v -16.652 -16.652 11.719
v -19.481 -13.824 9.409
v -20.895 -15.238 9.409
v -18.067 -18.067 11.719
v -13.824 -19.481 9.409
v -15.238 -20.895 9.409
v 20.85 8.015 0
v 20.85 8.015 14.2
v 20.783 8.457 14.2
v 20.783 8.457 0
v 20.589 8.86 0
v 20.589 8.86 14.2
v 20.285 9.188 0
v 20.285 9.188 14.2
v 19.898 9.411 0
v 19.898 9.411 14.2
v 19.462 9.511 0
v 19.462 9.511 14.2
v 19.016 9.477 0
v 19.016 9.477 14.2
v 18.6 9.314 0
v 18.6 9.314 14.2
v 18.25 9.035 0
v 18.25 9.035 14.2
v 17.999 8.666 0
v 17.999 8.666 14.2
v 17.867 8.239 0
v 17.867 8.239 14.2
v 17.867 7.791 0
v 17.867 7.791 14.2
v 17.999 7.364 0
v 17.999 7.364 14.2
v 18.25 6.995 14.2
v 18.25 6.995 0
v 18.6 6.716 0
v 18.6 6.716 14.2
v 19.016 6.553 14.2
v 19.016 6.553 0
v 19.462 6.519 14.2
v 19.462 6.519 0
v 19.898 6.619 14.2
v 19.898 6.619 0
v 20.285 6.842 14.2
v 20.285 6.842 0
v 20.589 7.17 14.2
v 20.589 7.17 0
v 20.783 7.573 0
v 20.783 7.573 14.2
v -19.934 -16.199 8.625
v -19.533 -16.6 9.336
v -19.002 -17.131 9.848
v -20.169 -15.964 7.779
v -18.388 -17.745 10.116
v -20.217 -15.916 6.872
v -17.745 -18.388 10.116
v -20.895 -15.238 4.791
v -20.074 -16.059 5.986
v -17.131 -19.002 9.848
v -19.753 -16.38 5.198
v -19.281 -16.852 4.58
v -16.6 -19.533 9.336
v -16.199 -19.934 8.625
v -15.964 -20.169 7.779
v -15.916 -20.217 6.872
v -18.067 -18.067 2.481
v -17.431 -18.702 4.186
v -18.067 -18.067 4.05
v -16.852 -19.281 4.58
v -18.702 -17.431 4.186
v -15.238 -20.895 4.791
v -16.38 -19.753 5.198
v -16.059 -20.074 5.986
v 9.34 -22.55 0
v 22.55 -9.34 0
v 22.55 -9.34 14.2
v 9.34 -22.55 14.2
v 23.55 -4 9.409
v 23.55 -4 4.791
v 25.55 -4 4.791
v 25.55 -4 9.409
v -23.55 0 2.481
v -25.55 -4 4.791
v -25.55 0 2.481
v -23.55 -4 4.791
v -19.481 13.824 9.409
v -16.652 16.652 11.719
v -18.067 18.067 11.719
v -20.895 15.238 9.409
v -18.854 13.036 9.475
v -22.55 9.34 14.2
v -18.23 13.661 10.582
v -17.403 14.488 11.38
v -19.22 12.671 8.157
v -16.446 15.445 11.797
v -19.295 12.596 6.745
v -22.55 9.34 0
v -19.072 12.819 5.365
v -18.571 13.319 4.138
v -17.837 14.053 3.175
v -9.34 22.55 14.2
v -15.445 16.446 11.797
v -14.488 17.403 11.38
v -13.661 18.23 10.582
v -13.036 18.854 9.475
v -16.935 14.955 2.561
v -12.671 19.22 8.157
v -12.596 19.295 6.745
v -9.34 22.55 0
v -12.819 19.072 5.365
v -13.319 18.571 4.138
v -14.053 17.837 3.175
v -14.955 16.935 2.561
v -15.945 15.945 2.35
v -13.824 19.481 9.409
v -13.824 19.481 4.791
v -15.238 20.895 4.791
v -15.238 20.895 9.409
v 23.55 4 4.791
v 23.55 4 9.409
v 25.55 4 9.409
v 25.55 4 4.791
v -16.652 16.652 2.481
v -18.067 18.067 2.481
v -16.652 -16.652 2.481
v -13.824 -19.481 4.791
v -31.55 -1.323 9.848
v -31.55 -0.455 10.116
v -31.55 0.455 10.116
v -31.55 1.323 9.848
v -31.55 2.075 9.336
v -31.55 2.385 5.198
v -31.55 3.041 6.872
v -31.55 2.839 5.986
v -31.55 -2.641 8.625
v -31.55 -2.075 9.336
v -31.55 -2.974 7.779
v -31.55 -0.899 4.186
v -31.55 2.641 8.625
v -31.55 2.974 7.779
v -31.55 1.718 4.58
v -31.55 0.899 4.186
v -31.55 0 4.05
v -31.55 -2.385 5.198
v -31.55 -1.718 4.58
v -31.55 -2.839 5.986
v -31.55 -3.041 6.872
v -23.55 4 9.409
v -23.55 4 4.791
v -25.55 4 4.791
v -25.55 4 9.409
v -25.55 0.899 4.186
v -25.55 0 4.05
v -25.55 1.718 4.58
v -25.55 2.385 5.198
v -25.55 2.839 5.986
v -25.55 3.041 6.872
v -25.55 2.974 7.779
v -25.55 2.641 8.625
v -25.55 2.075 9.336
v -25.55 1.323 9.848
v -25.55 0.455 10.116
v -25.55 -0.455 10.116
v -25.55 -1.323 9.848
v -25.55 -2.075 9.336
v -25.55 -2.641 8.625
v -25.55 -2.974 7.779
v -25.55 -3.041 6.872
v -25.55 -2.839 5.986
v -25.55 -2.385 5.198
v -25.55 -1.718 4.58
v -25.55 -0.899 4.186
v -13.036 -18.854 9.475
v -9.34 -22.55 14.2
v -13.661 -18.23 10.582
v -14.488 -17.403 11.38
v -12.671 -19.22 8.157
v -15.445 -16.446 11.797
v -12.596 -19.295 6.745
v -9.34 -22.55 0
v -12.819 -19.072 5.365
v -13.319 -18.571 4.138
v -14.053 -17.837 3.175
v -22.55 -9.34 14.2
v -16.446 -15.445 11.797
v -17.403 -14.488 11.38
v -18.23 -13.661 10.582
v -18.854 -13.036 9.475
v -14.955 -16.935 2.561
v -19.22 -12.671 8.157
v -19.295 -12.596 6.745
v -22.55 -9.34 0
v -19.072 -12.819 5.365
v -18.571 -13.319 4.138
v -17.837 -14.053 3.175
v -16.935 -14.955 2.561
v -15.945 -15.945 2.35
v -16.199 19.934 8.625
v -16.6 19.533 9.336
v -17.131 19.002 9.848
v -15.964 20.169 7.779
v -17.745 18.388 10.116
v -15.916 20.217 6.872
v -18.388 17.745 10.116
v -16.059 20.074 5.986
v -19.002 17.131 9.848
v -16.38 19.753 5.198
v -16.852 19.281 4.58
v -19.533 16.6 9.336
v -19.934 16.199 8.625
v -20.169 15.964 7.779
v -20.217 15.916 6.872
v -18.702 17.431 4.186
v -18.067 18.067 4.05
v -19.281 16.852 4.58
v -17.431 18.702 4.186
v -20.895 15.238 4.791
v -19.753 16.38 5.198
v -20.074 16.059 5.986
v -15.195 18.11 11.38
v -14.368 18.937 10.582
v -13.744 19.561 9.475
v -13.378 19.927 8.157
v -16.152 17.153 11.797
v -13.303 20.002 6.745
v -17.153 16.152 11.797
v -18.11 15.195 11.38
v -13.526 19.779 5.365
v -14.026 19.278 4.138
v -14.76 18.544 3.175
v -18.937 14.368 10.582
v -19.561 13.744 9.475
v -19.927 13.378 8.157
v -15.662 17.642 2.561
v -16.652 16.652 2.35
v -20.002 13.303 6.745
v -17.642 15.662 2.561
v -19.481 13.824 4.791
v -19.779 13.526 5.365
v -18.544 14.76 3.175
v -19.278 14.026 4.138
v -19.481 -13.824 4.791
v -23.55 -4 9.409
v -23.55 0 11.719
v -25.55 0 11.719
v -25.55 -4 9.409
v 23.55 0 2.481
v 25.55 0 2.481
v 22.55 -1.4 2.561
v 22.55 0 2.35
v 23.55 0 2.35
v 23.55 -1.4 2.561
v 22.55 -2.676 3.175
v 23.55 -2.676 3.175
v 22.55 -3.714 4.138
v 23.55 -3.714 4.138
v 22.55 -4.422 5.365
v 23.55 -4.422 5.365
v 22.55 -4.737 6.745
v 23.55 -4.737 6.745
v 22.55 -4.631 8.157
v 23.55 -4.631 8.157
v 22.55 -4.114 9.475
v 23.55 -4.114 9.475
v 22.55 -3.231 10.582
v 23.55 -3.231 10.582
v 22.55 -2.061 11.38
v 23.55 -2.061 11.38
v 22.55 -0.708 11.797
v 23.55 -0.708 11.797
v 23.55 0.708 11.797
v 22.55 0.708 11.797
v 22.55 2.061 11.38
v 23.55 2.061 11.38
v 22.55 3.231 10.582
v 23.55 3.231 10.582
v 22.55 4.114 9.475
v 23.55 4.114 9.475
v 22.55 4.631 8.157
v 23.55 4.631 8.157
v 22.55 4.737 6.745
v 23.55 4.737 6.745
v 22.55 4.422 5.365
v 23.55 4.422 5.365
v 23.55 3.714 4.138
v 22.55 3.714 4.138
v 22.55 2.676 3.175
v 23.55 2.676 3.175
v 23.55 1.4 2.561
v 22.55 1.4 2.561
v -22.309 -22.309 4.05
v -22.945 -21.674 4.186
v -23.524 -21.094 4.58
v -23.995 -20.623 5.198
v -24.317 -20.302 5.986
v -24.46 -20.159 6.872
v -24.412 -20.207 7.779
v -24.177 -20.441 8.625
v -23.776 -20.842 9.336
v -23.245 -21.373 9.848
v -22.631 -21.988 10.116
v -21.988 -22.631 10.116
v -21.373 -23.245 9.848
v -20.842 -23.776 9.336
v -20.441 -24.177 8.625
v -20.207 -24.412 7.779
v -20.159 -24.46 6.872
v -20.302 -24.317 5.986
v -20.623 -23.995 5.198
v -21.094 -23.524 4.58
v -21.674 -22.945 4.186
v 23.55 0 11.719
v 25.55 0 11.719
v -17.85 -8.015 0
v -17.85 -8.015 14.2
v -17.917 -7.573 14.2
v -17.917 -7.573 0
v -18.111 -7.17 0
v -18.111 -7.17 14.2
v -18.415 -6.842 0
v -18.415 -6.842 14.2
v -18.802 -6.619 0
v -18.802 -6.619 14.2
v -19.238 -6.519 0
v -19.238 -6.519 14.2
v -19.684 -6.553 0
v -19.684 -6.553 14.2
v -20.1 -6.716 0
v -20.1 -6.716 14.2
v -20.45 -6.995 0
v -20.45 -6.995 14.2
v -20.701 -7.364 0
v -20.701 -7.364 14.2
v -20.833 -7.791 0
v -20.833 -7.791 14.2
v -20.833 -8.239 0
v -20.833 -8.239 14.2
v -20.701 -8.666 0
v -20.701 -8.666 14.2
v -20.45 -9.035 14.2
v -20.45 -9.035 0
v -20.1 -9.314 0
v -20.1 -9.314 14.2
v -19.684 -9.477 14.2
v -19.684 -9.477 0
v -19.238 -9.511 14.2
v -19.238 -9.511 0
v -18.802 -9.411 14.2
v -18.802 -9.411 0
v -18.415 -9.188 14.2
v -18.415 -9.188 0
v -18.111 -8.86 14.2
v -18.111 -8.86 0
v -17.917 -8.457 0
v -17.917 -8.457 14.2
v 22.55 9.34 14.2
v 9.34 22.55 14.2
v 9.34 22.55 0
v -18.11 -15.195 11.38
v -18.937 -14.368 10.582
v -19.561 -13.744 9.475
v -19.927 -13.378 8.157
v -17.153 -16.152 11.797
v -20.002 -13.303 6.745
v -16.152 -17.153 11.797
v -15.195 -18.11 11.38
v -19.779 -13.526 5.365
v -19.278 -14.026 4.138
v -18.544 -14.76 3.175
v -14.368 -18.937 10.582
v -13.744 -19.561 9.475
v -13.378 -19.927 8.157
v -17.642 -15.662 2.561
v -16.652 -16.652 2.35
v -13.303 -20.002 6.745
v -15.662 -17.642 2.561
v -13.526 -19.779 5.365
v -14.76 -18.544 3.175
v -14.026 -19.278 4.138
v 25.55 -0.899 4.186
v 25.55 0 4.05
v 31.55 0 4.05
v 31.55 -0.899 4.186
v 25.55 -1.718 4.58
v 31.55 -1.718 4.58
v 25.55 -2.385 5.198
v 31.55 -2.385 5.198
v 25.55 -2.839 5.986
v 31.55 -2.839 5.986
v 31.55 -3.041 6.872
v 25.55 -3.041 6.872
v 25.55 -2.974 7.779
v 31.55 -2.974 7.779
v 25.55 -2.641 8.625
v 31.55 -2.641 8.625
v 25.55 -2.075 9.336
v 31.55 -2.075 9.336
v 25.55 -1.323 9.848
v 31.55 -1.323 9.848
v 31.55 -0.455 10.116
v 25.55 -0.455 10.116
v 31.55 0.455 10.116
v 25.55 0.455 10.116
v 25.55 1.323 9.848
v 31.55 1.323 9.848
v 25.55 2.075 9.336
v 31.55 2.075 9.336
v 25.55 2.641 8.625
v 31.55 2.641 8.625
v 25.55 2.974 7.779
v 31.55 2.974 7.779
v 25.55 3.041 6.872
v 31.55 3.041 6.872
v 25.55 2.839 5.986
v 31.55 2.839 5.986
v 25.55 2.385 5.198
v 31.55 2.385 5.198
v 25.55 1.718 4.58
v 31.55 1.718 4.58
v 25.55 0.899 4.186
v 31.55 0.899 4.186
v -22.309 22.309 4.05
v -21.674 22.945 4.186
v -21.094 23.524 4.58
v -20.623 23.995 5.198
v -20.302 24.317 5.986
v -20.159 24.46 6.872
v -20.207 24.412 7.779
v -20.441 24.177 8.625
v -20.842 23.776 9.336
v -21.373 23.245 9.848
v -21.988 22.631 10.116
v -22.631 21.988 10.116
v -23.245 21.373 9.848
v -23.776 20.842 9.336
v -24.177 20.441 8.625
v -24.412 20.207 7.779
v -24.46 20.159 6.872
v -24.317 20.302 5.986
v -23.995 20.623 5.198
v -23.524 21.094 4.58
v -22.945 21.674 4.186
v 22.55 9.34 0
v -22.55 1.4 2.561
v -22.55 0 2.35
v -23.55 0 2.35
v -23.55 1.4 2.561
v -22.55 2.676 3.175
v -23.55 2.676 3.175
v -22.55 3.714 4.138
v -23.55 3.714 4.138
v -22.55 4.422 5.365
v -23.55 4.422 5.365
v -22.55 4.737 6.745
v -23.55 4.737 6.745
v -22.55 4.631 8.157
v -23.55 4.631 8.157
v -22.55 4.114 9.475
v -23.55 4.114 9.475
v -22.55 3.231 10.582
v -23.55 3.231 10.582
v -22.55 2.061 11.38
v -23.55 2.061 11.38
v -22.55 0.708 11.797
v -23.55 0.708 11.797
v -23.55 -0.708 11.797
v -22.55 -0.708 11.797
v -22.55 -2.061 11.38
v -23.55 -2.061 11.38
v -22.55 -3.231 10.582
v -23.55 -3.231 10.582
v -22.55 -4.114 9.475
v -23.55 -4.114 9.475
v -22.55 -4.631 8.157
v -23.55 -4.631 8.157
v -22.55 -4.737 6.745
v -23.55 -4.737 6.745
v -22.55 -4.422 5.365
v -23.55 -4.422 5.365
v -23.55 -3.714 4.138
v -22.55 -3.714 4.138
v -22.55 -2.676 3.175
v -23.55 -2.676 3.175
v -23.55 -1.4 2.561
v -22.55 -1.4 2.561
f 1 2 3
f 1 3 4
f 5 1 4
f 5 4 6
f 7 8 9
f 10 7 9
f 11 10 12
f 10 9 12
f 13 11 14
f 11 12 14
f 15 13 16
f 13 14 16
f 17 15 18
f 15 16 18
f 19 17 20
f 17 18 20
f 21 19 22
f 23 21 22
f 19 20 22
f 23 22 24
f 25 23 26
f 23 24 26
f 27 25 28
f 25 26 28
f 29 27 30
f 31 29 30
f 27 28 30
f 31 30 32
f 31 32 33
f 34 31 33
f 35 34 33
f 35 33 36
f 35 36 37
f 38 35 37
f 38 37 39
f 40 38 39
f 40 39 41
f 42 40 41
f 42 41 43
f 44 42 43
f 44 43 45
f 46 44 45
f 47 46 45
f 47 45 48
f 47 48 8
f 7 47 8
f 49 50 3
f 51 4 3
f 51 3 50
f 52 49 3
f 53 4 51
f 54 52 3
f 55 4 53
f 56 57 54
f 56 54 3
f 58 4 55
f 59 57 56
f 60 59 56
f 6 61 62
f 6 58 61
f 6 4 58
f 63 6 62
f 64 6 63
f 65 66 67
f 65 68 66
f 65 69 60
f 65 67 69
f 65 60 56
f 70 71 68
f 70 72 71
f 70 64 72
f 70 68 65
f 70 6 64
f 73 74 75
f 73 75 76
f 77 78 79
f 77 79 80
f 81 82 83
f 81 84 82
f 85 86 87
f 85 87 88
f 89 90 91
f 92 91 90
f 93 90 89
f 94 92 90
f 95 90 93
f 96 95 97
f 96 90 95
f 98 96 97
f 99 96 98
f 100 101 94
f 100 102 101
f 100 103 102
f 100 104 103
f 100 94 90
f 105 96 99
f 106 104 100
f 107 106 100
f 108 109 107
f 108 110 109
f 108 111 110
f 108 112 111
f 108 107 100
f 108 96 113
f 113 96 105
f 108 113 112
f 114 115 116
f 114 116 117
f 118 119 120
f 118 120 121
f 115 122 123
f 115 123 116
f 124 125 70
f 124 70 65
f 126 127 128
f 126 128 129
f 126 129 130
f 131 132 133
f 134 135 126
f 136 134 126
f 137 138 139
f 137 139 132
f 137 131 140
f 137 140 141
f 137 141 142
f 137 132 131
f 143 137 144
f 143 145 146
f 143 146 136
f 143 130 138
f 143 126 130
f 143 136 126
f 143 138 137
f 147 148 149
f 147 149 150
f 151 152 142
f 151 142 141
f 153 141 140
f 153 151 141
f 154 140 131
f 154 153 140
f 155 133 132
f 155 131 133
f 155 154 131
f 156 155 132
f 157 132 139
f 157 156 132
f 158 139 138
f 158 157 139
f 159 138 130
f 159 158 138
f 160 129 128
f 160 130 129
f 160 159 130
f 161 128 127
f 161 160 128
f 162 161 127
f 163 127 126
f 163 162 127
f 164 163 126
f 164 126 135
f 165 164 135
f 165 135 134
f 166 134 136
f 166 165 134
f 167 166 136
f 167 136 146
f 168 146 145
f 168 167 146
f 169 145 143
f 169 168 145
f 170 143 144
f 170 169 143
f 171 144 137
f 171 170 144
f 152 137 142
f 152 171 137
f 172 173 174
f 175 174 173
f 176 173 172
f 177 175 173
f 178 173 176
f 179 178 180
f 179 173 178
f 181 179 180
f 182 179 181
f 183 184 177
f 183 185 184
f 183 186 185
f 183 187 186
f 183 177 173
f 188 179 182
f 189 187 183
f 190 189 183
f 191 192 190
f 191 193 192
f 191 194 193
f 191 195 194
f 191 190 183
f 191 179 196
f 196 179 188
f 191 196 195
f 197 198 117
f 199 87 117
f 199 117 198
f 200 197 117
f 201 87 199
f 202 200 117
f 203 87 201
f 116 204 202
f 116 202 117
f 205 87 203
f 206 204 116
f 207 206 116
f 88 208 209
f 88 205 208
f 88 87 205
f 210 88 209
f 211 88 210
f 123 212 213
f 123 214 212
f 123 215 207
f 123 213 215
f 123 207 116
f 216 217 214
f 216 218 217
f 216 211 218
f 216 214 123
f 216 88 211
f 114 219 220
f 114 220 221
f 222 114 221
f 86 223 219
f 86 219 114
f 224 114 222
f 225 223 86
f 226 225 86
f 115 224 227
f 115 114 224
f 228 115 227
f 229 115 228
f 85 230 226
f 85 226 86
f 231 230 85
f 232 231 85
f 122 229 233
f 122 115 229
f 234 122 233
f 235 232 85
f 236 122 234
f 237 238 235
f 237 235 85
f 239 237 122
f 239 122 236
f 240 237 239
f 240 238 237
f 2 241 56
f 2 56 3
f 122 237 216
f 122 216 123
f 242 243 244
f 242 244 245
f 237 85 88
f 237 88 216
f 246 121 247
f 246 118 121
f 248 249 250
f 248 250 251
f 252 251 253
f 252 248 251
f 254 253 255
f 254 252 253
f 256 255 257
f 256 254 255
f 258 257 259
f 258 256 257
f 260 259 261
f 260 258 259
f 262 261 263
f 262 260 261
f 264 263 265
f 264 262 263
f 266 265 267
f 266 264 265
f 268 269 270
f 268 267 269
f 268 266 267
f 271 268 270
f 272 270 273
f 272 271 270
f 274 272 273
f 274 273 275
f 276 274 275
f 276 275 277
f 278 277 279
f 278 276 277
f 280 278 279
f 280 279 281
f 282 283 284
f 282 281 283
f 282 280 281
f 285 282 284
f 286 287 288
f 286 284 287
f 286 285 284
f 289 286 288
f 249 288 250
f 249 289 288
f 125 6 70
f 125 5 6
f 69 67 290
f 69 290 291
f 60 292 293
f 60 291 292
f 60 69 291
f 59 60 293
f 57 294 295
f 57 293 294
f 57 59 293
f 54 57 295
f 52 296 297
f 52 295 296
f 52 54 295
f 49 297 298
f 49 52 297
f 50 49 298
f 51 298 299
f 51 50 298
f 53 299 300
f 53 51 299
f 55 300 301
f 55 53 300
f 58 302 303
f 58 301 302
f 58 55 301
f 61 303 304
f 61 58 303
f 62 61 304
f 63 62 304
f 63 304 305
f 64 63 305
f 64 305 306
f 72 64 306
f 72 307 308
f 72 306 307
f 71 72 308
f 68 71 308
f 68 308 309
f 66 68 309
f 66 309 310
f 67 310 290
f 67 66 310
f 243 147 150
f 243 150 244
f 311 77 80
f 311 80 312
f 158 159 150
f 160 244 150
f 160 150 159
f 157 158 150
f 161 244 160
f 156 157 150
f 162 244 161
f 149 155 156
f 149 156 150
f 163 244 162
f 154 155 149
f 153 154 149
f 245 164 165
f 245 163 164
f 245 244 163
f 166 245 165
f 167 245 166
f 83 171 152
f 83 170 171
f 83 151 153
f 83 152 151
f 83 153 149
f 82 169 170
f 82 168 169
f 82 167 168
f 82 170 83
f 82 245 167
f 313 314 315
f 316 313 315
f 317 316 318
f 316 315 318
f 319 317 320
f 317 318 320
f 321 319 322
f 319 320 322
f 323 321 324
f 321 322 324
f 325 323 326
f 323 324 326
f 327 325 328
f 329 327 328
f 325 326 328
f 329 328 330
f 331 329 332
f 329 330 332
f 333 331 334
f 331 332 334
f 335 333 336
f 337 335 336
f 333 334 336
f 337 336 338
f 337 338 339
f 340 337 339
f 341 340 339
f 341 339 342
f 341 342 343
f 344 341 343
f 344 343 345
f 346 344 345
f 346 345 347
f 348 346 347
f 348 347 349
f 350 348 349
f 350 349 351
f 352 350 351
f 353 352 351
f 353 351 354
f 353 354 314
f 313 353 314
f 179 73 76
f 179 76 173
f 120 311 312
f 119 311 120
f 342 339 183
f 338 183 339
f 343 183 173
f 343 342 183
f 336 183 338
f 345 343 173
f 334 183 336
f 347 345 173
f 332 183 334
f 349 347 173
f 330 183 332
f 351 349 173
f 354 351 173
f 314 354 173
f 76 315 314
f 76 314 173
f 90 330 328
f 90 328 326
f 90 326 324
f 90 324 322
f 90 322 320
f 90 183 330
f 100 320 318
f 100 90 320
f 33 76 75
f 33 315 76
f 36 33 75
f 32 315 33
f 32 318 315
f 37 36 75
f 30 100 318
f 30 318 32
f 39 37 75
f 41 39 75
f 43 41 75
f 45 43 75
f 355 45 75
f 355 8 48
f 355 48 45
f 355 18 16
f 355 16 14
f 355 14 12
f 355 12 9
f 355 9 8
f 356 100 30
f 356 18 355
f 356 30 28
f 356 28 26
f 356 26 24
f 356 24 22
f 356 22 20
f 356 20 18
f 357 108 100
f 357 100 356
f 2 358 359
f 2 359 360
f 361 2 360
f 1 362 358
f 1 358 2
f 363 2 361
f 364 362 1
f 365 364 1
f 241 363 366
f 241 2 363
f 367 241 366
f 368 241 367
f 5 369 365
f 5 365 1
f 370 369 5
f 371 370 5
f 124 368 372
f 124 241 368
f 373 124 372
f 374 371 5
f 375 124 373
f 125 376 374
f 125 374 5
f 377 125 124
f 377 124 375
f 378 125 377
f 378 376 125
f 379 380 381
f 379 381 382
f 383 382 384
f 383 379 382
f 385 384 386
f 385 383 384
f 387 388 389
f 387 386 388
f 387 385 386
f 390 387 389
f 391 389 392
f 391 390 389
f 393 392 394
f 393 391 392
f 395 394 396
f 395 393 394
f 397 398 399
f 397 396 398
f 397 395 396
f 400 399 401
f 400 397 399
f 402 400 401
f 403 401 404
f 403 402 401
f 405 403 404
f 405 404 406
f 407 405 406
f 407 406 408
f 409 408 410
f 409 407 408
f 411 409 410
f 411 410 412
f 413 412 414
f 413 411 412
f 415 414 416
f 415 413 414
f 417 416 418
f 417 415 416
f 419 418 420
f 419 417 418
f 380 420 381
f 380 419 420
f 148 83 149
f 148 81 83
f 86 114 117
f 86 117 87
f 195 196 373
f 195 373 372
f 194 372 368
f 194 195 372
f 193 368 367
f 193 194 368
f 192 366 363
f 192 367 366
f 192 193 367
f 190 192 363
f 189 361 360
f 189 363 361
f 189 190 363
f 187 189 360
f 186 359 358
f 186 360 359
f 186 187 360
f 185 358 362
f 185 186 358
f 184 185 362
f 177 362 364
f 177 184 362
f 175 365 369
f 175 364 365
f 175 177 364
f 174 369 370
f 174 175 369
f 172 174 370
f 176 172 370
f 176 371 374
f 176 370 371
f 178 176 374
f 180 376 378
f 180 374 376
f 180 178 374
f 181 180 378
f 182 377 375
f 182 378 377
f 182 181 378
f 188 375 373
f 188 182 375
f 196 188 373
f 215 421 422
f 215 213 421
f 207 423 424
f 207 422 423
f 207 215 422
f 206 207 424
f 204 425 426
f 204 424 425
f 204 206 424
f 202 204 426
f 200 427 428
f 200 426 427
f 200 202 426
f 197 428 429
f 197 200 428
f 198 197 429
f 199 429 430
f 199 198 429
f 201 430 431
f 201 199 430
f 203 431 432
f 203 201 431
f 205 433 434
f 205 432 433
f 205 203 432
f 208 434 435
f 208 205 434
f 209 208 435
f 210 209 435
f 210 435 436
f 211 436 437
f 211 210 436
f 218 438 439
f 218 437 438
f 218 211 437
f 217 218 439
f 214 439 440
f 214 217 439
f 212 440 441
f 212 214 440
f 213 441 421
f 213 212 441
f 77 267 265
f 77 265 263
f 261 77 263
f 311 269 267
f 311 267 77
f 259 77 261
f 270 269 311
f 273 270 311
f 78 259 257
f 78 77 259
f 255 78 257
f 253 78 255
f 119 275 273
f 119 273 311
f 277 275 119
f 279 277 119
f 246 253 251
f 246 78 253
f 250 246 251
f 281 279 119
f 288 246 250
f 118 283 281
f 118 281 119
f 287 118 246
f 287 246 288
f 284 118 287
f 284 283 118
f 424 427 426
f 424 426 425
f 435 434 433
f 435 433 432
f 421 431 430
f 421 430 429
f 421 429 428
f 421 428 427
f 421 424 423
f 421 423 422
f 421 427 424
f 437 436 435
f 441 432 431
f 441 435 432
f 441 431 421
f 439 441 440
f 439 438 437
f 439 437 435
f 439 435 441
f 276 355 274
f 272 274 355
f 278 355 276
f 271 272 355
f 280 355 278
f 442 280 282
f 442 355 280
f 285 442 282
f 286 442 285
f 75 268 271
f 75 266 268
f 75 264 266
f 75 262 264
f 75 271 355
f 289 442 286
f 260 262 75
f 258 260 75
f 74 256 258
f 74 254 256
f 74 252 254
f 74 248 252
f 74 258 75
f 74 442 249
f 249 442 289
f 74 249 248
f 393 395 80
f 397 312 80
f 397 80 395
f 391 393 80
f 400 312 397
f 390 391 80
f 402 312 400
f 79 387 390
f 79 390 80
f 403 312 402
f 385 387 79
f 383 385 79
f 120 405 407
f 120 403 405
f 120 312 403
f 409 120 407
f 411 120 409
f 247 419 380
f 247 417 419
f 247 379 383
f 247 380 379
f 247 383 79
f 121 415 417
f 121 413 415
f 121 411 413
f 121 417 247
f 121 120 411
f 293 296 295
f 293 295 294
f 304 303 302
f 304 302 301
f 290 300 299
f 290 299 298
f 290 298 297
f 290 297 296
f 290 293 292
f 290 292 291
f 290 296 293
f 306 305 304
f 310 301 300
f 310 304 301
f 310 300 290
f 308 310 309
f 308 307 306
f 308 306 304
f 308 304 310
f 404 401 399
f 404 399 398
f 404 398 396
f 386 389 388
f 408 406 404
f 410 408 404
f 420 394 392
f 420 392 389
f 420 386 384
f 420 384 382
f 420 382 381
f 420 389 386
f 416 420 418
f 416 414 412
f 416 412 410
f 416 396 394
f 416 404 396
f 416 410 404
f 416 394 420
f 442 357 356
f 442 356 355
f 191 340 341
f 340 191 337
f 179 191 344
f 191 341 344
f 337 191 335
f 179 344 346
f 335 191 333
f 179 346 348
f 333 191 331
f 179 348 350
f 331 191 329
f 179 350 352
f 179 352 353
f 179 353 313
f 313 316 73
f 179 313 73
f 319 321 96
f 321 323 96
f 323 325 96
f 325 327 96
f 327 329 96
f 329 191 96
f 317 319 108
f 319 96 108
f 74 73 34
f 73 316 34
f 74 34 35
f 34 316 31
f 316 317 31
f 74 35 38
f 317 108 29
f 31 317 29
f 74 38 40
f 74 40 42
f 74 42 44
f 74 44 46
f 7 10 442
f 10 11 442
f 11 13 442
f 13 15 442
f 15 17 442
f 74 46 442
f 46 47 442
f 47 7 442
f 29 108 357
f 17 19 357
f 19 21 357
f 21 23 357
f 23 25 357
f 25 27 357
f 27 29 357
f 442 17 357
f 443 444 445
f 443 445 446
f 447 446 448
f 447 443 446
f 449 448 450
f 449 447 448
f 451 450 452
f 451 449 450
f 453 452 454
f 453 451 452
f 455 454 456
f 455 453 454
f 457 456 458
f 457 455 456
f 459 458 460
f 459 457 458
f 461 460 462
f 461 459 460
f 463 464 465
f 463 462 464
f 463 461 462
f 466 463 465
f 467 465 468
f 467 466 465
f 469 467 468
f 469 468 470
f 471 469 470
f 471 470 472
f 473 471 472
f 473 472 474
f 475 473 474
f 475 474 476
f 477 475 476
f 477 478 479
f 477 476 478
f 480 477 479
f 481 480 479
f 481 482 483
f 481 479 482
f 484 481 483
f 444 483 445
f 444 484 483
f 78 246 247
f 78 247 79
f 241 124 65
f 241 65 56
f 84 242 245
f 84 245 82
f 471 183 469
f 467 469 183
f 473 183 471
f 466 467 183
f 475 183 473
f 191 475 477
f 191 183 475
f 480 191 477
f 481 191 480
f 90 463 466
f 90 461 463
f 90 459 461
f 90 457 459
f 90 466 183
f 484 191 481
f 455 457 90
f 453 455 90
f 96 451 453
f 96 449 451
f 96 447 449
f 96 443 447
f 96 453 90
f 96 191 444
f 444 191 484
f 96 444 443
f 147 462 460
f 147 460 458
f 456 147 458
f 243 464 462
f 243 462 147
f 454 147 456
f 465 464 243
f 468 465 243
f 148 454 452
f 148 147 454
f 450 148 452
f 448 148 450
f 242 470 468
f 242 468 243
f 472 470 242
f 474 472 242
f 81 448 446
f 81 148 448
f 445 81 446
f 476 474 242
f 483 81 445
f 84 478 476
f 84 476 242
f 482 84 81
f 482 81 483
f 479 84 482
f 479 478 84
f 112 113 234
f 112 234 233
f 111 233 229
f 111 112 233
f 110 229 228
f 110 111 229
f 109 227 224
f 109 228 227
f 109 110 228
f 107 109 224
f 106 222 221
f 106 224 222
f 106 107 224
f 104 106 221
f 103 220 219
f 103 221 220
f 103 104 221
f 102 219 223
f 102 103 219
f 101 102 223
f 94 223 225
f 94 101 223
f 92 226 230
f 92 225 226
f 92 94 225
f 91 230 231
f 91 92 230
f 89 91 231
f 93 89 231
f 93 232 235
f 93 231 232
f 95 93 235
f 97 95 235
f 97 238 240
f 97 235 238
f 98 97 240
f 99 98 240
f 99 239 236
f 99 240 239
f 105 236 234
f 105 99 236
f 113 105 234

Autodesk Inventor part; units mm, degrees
ref_plane "YZ Plane" through (0, 0, 0) normal (1, 0, 0) x (0, 1, 0)
ref_plane "XZ Plane" through (0, 0, 0) normal (0, 1, 0) x (-1, 0, 0)
ref_plane "XY Plane" through (0, 0, 0) normal (0, 0, 1) x (1, 0, 0)
sketch "Sketch1" plane through (0, 0, 0) normal (0, 0, 1) x (1, 0, 0)
  line L0 (-22.55, 9.3405) -> (-9.3405, 22.55)
  line L1 (-9.3405, 22.55) -> (9.3405, 22.55)
  line L2 (9.3405, 22.55) -> (22.55, 9.3405)
  line L3 (22.55, 9.3405) -> (22.55, -9.3405)
  line L4 (22.55, -9.3405) -> (9.3405, -22.55)
  line L5 (9.3405, -22.55) -> (-9.3405, -22.55)
  line L6 (-9.3405, -22.55) -> (-22.55, -9.3405)
  line L7 (-22.55, -9.3405) -> (-22.55, 9.3405)
  point P0 (0, 0)
  point P1 (0, 0)
  point P2 (0, 22.55)
  dimension "d0" = 45.1
extrude "Extrusion1" add sketch "Sketch1" along normal blind 14.2
sketch "Sketch2" plane through (22.55, -9.3405, 0) normal (1, 0, 0) x (0, 0, -1)
  circle A0 centre (-7.1, 9.3405) radius 4.75
  line L0 (0, 0) -> (0, 18.681) projected
  line L1 (0, 18.681) -> (-14.2, 18.681) projected
  point P0 (0, 9.3405)
  point P1 (0, 9.3405)
  point P2 (-7.1, 18.681)
  dimension "d3" = 9.5
extrude "Extrusion2" add sketch "Sketch2" along normal blind 1
sketch "Sketch3" plane through (23.55, 0, 7.1) normal (1, 0, 0) x (0, 0, -1)
  line L0 (4.6188, 0) -> (2.3094, -4)
  line L1 (2.3094, -4) -> (-2.3094, -4)
  line L2 (-2.3094, -4) -> (-4.6188, 0)
  line L3 (-4.6188, 0) -> (-2.3094, 4)
  line L4 (-2.3094, 4) -> (2.3094, 4)
  line L5 (2.3094, 4) -> (4.6188, 0)
  line L6 (7.1, 9.3405) -> (-7.1, 9.3405) projected
  point P0 (7.1, 0)
  point P1 (0, 0)
  point P2 (0, 9.3405)
  dimension "d6" = 8
extrude "Extrusion3" add sketch "Sketch3" along normal blind 2
sketch "Sketch5" plane through (25.55, 0, 7.1) normal (1, 0, 0) x (0, 0, -1)
  circle A0 centre (0, 0) radius 3.05
  point P0 (7.1, 0)
  dimension "d9" = 6.1
extrude "Extrusion4" add sketch "Sketch5" along normal blind 6
pattern_circular "Circular Pattern1" count 2 over 135 about axis through (0, 0, -10) along (0, 0, 1) of "Extrusion2", "Extrusion3", "Extrusion4"
pattern_circular "Circular Pattern2" count 2 over 360 about axis through (0, 0, -10) along (0, 0, 1) of "Extrusion2", "Extrusion3", "Extrusion4"
pattern_circular "Circular Pattern3" count 2 over 225 about axis through (0, 0, -10) along (0, 0, 1) of "Extrusion2", "Extrusion3", "Extrusion4"
sketch "Sketch7" plane through (0, 0, 14.2) normal (0, 0, 1) x (1, 0, 0)
  circle A0 centre (19.35, 8.015) radius 1.5
  line L0 (22.55, 9.3405) -> (9.3405, 22.55) projected
  line L1 (22.55, 9.3405) -> (-22.55, -9.3405)
  circle A1 centre (-19.35, -8.015) radius 1.5
  point P0 (0, 0)
  dimension "d21" = 3
  dimension "d22" = 6.4
  dimension "d25" = 360
extrude "Extrusion5" cut sketch "Sketch7" against normal through all
properties part number "signal_combiner"
